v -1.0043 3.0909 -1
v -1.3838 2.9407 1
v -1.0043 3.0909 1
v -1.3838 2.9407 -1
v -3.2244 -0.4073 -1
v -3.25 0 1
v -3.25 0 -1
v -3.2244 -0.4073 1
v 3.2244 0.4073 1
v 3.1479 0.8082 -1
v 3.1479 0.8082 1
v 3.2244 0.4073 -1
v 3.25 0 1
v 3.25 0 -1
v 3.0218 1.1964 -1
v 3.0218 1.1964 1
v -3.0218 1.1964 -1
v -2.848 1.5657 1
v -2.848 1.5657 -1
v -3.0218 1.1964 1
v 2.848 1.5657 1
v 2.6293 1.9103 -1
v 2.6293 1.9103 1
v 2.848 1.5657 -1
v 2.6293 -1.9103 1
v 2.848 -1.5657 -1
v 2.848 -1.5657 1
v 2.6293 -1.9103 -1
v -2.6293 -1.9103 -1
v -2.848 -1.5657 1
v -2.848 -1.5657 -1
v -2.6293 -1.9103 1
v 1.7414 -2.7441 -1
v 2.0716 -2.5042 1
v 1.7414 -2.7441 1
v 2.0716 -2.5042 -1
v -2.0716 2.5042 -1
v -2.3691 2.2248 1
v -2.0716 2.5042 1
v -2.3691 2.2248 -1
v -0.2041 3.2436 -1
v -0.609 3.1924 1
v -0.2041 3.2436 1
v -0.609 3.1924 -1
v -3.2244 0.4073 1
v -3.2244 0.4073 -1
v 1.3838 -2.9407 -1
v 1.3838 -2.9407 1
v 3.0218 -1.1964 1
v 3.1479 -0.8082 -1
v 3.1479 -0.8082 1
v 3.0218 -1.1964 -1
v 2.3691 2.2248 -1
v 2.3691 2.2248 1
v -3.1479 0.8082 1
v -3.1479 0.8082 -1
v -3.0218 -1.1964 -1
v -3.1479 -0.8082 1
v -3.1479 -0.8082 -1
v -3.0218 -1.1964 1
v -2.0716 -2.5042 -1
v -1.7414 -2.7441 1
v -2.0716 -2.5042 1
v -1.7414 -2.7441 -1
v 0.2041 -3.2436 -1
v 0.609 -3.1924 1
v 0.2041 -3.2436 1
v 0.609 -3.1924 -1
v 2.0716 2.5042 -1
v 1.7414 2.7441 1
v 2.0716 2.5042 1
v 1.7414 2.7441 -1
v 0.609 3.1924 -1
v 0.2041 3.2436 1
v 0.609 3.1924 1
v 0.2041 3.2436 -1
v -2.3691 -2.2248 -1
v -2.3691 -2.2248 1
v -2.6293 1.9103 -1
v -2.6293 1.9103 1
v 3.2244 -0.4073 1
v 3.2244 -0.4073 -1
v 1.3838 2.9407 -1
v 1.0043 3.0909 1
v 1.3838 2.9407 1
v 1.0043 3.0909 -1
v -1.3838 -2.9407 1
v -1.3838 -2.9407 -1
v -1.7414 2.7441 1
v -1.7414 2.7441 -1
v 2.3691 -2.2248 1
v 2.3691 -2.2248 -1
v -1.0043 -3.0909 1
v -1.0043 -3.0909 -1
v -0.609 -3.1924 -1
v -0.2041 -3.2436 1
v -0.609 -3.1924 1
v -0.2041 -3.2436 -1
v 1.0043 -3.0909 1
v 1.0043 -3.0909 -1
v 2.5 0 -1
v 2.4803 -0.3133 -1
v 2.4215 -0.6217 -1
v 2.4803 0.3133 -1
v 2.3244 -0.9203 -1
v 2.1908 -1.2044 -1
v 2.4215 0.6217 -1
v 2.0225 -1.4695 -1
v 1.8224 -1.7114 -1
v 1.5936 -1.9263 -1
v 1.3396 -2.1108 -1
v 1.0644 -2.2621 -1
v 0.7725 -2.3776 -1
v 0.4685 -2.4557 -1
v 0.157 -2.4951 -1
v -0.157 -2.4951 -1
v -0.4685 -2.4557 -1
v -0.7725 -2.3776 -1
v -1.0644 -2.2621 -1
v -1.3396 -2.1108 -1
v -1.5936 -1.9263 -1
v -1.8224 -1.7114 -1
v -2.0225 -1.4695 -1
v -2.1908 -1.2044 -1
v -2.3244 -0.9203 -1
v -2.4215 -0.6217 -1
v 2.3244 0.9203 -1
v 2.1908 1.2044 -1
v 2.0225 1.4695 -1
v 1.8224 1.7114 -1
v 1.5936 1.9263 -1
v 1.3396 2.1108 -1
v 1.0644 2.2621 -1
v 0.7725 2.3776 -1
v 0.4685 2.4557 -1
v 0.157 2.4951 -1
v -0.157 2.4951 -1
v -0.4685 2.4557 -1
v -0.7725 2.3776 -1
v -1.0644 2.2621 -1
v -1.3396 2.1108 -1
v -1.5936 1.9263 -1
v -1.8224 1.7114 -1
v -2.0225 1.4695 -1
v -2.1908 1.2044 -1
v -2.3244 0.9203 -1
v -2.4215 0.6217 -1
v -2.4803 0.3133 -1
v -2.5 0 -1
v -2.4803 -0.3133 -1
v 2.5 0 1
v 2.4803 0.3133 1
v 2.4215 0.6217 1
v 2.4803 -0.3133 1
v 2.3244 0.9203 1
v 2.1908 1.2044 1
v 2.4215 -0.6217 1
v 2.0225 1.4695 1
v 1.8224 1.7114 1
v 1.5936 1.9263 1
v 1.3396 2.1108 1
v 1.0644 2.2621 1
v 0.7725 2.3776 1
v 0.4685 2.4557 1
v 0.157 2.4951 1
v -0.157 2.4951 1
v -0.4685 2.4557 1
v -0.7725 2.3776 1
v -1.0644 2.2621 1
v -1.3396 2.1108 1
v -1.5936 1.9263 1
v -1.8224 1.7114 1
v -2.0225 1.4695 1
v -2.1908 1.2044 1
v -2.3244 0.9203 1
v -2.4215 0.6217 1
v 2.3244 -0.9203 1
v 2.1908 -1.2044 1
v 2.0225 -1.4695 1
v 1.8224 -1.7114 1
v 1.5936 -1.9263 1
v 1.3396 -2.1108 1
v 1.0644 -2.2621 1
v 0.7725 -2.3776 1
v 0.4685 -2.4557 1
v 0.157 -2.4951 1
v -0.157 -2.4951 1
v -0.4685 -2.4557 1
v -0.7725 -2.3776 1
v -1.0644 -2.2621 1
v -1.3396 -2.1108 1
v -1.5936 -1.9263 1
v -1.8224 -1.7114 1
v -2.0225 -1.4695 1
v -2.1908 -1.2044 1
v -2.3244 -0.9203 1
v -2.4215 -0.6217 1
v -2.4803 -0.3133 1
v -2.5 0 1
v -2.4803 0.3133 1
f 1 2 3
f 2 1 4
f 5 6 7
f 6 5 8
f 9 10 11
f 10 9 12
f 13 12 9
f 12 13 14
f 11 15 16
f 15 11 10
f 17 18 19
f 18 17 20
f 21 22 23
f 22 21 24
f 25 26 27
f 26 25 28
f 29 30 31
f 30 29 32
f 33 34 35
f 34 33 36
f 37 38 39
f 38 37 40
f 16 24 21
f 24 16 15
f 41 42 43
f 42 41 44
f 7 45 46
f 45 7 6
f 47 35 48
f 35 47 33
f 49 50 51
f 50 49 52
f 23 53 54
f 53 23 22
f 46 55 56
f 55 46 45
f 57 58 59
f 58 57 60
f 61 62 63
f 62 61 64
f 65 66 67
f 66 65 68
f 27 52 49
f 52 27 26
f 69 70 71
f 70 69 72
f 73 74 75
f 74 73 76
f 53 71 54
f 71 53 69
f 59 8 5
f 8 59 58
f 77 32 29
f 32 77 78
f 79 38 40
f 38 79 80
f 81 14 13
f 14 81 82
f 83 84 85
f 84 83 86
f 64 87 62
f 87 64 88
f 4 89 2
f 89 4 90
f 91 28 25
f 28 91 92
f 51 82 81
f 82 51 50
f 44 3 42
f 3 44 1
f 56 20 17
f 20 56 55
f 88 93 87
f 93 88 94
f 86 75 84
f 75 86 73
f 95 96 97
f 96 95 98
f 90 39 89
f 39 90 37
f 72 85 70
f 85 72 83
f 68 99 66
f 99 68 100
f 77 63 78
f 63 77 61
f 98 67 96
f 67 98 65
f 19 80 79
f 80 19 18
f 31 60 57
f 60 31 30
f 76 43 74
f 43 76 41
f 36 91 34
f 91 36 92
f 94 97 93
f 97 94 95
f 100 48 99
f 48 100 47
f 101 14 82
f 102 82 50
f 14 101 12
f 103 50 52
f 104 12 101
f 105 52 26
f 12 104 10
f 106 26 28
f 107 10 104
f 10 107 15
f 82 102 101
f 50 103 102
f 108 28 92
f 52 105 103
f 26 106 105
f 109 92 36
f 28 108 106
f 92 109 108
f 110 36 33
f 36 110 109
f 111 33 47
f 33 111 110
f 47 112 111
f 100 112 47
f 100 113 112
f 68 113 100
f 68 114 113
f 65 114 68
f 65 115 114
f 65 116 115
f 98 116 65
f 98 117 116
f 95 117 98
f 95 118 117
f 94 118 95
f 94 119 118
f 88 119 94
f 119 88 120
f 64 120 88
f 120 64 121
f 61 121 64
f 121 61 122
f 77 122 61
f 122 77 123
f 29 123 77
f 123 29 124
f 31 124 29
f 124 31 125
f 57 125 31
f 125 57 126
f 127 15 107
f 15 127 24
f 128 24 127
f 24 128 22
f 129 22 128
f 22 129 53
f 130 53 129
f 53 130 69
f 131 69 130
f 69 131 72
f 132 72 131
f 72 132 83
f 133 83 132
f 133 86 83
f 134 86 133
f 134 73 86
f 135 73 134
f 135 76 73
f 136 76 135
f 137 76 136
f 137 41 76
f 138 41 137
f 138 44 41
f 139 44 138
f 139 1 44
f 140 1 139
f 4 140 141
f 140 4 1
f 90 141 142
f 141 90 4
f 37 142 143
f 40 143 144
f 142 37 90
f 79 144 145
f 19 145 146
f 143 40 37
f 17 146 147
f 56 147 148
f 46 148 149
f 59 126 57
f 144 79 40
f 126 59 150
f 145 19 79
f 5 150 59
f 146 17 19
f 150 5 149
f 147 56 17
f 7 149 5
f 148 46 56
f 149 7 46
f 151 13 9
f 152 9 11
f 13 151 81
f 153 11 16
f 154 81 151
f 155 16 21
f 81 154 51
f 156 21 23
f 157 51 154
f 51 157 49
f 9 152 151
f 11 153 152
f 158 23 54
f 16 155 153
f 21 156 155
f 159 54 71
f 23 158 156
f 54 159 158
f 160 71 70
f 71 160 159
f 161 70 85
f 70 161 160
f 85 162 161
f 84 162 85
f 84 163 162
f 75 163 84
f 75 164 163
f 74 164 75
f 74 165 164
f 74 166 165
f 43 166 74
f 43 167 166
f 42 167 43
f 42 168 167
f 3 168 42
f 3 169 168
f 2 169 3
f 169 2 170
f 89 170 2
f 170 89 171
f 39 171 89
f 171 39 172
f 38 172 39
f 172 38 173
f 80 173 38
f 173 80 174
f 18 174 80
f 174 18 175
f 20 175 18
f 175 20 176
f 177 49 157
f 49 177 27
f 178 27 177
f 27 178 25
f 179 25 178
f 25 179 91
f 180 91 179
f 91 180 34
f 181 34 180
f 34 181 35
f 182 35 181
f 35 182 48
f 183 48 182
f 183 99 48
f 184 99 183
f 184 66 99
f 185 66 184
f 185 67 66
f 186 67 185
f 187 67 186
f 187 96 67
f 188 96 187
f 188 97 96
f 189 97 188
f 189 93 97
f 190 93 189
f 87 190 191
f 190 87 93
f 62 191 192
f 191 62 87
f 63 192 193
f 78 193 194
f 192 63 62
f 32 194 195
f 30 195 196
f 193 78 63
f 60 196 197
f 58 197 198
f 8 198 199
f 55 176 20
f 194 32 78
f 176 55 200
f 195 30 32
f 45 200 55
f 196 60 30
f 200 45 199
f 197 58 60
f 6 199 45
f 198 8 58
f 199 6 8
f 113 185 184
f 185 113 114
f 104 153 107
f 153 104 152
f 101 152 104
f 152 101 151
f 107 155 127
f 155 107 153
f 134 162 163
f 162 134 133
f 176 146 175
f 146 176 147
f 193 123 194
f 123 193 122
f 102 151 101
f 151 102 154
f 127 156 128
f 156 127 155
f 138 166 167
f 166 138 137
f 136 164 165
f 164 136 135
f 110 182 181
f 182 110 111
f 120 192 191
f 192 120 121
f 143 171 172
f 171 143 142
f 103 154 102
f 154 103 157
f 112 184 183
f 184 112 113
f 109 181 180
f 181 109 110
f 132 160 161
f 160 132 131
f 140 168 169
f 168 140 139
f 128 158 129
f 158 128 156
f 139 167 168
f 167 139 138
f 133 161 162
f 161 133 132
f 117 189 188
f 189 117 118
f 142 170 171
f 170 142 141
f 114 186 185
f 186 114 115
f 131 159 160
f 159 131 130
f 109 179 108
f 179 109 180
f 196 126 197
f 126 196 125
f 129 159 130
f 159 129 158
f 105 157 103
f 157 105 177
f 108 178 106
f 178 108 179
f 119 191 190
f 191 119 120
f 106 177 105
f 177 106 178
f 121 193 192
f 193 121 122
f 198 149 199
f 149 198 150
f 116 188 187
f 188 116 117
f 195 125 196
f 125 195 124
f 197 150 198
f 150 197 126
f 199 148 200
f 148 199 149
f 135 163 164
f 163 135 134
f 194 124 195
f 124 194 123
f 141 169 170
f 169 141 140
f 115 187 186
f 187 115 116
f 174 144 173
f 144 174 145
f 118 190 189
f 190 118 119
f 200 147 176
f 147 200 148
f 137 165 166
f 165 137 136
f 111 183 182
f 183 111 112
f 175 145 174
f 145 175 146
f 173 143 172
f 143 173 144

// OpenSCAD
$fn = 50;


difference() {
	union() {
		translate(v = [0, 0, -1.0000000000]) {
			cylinder(h = 2, r = 3.2500000000);
		}
	}
	union() {
		translate(v = [0, 0, -100.0000000000]) {
			cylinder(h = 200, r = 2.5000000000);
		}
	}
}
